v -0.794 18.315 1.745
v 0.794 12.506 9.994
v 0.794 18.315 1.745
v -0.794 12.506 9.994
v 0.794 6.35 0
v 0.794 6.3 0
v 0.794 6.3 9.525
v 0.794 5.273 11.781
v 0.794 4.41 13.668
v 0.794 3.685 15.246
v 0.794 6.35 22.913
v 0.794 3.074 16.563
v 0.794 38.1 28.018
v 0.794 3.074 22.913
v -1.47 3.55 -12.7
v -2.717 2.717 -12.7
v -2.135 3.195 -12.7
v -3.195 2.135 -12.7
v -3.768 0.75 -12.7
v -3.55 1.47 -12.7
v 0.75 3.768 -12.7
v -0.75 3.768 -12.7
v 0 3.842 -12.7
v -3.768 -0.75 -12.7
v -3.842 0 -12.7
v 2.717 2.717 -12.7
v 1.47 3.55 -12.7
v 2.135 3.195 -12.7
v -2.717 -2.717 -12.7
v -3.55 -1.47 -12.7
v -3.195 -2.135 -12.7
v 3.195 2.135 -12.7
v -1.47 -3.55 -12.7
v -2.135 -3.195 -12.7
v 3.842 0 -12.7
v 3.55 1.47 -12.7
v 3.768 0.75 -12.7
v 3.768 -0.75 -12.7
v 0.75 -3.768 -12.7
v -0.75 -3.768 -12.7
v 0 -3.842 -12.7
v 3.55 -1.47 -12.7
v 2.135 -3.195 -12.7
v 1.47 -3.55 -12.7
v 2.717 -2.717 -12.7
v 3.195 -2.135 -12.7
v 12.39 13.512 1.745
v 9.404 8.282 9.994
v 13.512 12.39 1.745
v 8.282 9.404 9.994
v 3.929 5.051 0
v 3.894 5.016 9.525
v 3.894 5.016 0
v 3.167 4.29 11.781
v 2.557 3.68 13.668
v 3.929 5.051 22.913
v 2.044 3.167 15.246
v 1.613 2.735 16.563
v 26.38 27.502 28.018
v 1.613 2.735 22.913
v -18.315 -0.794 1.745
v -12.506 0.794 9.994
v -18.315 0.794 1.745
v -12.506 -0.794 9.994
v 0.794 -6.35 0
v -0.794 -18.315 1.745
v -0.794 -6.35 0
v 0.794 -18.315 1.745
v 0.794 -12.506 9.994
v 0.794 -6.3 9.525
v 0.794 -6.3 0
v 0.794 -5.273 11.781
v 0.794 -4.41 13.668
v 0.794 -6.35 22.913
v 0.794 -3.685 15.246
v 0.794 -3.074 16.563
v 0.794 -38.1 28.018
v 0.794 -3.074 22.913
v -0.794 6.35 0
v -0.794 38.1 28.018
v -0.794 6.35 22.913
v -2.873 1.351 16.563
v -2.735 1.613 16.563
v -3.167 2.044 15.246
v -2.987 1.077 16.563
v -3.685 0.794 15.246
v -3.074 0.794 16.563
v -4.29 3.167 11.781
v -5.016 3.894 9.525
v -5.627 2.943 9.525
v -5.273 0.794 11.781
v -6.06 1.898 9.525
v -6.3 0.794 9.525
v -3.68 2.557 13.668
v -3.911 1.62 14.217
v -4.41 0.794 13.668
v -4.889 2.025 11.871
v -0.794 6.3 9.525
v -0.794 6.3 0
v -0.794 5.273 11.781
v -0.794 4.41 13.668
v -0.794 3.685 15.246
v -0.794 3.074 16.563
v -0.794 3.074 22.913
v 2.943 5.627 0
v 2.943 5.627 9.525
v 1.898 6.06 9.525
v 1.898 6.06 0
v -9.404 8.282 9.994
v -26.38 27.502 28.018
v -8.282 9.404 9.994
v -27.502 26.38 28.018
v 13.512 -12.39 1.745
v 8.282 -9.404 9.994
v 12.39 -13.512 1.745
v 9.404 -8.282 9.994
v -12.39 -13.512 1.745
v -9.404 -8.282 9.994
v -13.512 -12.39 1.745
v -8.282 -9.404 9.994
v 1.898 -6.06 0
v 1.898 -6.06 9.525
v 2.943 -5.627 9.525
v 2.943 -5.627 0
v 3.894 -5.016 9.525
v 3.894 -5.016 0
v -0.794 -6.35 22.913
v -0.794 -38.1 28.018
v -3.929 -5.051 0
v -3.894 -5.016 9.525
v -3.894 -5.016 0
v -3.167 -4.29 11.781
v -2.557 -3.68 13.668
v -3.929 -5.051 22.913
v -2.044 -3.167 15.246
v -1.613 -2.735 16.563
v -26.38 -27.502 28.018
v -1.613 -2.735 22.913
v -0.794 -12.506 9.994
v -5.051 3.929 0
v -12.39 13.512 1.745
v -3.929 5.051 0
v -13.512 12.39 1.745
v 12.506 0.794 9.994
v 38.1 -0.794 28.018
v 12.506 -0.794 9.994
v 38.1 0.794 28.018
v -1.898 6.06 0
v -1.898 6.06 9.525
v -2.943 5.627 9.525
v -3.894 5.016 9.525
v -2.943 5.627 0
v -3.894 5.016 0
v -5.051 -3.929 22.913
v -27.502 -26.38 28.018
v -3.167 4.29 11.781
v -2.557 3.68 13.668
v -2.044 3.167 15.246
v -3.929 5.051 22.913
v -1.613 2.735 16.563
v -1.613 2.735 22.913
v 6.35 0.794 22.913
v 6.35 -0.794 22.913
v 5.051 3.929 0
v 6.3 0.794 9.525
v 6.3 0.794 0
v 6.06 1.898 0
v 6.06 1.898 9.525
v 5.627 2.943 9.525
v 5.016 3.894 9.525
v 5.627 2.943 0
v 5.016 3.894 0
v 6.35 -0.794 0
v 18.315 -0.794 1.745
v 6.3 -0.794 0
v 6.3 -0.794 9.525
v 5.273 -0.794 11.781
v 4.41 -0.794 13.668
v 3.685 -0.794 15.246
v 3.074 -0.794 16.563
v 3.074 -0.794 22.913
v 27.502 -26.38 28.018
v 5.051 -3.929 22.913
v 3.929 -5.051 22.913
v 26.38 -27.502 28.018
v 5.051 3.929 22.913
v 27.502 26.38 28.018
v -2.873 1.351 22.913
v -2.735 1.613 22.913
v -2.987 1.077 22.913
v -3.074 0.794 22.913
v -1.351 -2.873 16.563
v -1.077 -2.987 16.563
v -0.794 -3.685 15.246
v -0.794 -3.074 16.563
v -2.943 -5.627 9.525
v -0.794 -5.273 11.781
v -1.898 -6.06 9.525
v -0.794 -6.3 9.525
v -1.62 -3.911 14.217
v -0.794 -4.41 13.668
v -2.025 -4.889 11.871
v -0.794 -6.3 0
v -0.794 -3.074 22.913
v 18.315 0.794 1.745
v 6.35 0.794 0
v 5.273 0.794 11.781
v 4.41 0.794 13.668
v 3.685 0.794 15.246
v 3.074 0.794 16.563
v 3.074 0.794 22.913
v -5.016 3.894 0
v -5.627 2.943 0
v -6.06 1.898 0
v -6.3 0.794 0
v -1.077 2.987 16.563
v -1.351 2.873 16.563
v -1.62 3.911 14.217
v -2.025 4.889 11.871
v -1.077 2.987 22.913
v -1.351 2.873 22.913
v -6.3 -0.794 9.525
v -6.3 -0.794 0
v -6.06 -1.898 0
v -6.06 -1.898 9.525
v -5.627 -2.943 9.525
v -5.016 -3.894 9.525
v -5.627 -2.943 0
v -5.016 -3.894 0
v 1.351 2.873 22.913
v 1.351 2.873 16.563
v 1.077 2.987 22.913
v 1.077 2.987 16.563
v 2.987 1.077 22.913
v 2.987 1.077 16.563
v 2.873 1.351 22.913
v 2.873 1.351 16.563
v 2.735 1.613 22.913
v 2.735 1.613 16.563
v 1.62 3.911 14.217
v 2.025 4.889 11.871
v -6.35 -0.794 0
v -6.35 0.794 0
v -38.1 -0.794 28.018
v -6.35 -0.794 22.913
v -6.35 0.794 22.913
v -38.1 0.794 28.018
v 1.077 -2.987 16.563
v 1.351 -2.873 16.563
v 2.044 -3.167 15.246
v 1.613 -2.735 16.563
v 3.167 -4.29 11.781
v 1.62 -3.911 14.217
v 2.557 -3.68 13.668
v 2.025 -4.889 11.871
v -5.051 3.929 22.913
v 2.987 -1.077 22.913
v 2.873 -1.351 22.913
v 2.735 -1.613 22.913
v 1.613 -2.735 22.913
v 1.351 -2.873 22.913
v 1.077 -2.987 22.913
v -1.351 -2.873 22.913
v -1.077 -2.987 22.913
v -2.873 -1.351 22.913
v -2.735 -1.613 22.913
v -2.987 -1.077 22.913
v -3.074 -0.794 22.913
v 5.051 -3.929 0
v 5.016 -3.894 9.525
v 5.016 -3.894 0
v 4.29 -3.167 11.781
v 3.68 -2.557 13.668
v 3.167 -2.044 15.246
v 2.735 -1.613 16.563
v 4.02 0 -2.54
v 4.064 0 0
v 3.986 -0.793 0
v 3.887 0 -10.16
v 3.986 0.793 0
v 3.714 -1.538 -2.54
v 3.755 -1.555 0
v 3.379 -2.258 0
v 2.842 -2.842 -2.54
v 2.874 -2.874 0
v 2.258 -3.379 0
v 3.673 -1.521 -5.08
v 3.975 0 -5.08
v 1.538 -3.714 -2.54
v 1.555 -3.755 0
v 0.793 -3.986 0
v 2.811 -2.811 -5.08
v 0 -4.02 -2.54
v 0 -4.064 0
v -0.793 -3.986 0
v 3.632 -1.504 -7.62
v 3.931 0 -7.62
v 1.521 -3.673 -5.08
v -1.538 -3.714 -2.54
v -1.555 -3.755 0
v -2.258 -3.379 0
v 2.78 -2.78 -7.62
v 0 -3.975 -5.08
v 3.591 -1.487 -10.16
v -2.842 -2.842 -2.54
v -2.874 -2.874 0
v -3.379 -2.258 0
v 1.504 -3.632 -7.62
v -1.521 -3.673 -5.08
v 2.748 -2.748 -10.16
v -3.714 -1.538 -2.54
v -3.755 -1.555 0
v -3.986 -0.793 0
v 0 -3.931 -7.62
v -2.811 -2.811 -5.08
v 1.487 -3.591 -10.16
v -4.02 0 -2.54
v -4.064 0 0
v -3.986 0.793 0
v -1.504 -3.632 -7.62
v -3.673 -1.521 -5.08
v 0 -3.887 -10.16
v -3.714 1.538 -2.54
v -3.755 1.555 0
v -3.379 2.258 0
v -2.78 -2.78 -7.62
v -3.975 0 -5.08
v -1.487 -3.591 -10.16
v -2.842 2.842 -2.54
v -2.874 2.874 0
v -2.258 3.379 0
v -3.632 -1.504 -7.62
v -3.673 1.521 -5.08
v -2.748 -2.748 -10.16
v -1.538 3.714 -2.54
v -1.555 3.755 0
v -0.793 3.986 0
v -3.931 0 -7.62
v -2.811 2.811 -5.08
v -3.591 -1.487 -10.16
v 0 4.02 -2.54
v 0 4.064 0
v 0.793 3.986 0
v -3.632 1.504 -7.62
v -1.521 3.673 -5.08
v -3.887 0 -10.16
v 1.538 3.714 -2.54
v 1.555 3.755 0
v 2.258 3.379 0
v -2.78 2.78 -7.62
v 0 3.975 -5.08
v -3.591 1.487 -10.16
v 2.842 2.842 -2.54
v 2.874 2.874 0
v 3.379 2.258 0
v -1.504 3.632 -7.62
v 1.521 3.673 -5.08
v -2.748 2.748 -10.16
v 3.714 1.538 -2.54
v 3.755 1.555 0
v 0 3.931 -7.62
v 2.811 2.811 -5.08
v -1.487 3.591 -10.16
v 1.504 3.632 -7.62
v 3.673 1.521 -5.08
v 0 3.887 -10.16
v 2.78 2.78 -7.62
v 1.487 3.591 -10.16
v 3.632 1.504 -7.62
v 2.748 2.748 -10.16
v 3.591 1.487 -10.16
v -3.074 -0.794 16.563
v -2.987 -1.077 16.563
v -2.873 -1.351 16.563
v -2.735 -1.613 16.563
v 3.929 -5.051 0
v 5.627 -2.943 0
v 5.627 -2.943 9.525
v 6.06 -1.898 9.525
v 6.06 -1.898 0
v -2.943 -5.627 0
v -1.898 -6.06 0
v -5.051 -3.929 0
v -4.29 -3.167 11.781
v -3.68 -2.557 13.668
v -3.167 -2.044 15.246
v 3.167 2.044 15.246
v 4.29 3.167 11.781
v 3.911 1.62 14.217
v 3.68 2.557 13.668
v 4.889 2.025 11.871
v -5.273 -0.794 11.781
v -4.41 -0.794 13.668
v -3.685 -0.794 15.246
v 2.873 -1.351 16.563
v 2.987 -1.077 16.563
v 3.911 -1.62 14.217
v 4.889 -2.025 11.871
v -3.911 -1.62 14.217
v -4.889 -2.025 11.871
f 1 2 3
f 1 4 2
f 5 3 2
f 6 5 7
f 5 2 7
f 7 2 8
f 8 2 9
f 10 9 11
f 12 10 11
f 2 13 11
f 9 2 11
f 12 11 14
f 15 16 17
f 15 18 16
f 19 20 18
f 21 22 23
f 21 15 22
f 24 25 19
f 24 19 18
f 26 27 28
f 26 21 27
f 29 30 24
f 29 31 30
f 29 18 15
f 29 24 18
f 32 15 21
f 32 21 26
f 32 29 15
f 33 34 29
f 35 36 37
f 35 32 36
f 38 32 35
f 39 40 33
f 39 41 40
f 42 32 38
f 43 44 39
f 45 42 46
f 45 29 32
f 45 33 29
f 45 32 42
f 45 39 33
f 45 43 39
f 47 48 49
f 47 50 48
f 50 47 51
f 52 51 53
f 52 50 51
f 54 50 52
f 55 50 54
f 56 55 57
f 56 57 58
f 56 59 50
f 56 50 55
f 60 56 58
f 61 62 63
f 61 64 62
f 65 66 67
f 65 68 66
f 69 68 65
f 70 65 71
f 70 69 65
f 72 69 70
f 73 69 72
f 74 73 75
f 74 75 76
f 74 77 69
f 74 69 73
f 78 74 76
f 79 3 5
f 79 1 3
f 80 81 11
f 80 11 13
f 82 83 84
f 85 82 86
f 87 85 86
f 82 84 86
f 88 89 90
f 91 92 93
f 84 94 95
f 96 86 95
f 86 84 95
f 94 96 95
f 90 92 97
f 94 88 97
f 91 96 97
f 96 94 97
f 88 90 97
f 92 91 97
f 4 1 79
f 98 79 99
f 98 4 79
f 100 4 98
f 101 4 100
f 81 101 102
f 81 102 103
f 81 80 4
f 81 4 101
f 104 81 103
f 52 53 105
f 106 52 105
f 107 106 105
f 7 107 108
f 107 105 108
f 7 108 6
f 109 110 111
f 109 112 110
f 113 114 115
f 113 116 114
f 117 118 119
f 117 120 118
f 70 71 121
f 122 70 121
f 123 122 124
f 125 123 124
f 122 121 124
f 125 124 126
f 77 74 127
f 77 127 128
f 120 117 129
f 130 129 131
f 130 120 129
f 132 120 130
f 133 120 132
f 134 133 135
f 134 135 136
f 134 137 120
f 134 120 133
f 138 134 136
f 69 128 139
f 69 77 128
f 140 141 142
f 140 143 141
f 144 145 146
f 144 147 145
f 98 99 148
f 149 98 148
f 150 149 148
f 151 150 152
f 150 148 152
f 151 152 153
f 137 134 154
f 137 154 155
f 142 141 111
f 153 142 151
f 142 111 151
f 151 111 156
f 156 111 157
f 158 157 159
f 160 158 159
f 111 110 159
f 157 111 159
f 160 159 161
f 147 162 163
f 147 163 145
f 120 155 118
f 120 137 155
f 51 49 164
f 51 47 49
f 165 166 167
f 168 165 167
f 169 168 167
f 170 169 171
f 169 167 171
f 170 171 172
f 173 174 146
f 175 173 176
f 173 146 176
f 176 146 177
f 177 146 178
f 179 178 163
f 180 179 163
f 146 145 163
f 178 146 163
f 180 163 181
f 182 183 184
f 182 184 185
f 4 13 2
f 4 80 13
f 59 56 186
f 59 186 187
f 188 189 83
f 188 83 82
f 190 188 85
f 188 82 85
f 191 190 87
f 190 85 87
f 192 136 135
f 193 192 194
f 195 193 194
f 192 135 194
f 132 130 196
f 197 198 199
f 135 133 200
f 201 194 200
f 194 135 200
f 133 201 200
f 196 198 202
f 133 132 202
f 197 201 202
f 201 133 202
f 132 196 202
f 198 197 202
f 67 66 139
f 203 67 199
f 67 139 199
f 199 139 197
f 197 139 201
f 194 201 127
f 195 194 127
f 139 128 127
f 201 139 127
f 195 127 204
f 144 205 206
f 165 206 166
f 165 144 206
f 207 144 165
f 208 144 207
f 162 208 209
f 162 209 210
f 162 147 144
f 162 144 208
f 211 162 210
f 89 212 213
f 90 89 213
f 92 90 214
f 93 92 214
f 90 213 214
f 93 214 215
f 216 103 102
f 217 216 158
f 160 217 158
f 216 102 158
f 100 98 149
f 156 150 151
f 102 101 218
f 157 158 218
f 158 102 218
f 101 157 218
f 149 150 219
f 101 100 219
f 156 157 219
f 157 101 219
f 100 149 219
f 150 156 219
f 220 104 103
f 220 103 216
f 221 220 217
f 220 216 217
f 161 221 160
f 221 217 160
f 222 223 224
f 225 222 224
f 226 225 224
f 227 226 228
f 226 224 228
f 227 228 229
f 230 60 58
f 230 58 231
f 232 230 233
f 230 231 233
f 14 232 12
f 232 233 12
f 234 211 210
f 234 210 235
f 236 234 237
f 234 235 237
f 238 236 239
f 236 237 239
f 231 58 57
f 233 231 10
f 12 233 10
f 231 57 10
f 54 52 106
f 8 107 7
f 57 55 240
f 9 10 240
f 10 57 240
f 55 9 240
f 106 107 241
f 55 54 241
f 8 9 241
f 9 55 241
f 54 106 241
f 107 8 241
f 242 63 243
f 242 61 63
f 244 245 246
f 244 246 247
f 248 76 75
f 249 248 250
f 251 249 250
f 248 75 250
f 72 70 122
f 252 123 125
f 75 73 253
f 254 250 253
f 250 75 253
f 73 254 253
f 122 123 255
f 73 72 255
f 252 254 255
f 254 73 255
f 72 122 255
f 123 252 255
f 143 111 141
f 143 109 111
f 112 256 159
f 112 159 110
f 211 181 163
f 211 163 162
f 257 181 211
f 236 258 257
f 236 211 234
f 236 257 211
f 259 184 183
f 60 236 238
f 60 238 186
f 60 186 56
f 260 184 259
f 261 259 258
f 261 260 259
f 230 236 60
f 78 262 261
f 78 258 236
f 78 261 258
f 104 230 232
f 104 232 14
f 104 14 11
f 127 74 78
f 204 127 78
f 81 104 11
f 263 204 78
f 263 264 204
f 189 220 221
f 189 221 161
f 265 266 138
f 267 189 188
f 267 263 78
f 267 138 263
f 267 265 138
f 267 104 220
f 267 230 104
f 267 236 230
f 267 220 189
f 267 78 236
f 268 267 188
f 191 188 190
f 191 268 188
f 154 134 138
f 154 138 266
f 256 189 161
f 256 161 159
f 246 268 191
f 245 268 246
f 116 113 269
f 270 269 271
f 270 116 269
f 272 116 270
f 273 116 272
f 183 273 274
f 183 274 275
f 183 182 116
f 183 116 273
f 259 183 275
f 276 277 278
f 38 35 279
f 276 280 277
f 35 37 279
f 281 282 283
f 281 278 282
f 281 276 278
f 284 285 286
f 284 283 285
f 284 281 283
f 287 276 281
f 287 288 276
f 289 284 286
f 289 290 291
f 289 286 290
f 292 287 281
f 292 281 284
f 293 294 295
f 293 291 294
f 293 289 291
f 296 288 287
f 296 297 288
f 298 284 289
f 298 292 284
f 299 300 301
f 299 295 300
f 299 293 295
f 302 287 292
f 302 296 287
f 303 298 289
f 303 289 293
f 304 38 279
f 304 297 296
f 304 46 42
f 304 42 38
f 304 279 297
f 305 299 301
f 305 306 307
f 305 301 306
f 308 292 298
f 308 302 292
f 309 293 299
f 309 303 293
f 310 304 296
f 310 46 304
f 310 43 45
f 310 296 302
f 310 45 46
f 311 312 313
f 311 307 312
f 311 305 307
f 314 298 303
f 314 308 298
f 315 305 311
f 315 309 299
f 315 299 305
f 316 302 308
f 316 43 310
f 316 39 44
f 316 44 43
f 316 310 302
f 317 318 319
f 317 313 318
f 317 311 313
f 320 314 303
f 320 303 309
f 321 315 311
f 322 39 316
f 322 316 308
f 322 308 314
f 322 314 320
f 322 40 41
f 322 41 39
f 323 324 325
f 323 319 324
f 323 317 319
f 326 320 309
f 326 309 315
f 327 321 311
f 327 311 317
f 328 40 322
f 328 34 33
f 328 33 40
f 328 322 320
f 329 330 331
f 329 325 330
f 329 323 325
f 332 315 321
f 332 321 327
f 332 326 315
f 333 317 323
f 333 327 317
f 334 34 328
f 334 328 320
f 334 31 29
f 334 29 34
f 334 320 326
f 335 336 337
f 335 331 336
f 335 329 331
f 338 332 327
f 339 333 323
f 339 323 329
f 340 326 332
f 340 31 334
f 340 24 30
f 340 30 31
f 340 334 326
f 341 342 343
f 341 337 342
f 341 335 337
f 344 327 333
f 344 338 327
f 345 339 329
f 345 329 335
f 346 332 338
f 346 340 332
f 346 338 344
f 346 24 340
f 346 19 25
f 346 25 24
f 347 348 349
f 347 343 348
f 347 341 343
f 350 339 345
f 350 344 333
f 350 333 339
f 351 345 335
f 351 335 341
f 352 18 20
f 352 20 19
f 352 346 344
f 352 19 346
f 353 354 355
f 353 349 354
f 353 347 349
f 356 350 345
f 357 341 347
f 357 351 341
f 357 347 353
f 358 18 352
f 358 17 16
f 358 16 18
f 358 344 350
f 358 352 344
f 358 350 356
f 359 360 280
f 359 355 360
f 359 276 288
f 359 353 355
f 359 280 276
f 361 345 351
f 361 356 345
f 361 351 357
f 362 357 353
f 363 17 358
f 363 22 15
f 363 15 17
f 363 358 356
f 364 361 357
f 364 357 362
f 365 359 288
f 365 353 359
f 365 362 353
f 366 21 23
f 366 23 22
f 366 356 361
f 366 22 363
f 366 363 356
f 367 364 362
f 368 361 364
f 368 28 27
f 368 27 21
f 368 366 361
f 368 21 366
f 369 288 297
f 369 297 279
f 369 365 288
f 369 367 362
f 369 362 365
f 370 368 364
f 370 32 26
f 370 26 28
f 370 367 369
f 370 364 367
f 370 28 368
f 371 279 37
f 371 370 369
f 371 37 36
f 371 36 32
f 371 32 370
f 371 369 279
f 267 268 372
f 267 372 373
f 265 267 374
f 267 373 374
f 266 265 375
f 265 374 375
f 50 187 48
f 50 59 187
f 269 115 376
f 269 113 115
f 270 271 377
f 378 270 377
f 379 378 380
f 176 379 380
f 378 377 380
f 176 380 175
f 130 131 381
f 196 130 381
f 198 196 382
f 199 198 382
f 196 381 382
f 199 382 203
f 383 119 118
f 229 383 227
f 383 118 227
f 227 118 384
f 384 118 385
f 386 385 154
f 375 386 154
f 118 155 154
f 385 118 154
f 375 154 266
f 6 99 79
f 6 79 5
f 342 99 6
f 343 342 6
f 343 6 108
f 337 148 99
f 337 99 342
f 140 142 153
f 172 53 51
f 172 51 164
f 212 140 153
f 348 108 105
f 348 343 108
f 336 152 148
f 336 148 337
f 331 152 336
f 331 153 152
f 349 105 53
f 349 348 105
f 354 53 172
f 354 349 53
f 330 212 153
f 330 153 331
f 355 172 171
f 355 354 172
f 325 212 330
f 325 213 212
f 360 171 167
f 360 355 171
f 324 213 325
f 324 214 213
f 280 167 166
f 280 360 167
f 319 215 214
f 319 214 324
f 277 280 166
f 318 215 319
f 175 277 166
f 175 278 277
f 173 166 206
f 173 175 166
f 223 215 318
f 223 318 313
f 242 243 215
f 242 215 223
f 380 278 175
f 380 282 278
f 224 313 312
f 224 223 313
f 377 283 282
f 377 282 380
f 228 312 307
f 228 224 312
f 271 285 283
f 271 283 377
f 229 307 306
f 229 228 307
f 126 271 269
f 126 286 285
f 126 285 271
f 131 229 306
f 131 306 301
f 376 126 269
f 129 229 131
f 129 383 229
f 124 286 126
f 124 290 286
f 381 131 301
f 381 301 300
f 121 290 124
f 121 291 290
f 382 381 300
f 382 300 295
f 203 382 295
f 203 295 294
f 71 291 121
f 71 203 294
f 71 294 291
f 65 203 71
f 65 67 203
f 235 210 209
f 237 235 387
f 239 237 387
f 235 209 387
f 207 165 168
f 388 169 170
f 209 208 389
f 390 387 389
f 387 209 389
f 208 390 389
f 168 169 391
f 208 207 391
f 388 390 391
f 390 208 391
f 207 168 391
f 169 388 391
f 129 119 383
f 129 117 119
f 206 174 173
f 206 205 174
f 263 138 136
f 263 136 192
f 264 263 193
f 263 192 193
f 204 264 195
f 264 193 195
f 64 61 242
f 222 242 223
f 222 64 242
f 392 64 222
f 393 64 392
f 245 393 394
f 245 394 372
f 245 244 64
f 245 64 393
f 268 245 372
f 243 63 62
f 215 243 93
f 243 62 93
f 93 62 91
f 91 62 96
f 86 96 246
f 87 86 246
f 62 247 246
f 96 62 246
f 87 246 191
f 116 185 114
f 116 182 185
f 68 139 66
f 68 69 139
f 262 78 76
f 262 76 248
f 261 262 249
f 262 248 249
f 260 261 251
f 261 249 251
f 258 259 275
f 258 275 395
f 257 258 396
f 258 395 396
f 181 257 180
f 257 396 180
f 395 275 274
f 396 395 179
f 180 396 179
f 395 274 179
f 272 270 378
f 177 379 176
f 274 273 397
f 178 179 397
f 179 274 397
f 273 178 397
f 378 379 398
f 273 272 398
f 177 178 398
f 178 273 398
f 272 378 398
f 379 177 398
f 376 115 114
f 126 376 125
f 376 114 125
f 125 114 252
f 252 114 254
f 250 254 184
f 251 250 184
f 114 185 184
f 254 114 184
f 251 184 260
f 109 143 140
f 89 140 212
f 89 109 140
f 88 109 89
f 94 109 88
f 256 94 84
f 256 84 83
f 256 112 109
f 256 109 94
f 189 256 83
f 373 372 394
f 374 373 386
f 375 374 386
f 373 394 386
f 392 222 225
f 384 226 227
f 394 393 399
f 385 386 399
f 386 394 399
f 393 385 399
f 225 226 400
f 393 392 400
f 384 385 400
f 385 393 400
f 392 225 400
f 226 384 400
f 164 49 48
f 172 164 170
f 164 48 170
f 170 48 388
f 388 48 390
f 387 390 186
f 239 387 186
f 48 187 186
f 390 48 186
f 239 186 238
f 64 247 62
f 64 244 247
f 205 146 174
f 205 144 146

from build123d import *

# Parameters (mm, degrees)
F2_R     = 4.064
F3_DEPTH = 12.7
F3_TAPER = 1
F5_DEPTH = 0.79375
F6_COUNT = 8


with BuildPart() as f1:
    # F0 (on Front) → F1 (revolve)
    with BuildSketch(Plane.XZ):
        Polygon((-6.35, 0), (0, 0), (0, 22.9133968065), (-3.175, 22.9133968065), (-3.175, 16.5633968065), (-6.35, 9.525), align=None)
    revolve(axis=Axis((0, 0, 20.1071155777), (0, 0, 1)))

    # F2 (on face) → F3 (join)
    with BuildSketch(Plane(origin=(0, 0, 0), x_dir=(1, 0, 0), z_dir=(0, 0, -1))):
        Circle(F2_R)
    extrude(amount=F3_DEPTH, taper=F3_TAPER)

    # F4 (on Front) → F5 (join, symmetric)
    with BuildSketch(Plane.XZ):
        Polygon((-18.3153760806, 1.7450850807), (-6.35, 0), (-6.0325, 0), (-6.0325, 9.4567020336), (-2.8575, 16.4950988401), (-2.8575, 22.9133968065), (-3.175, 22.9133968065), (-6.35, 22.9133968065), (-38.1, 28.0183404684), (-12.5059876591, 9.994440712), align=None)
    extrude(amount=F5_DEPTH, both=True)

    # F6: F1 ×8 about axis
    f6_axis = Axis((0, 0, 20.1071155777), (0, 0, 1))


with BuildPart() as f1_1:
    add(f1.part)
    for i in range(1, F6_COUNT):
        add(f1.part.rotate(f6_axis, i * 360 / F6_COUNT))


solid = f1_1.part
